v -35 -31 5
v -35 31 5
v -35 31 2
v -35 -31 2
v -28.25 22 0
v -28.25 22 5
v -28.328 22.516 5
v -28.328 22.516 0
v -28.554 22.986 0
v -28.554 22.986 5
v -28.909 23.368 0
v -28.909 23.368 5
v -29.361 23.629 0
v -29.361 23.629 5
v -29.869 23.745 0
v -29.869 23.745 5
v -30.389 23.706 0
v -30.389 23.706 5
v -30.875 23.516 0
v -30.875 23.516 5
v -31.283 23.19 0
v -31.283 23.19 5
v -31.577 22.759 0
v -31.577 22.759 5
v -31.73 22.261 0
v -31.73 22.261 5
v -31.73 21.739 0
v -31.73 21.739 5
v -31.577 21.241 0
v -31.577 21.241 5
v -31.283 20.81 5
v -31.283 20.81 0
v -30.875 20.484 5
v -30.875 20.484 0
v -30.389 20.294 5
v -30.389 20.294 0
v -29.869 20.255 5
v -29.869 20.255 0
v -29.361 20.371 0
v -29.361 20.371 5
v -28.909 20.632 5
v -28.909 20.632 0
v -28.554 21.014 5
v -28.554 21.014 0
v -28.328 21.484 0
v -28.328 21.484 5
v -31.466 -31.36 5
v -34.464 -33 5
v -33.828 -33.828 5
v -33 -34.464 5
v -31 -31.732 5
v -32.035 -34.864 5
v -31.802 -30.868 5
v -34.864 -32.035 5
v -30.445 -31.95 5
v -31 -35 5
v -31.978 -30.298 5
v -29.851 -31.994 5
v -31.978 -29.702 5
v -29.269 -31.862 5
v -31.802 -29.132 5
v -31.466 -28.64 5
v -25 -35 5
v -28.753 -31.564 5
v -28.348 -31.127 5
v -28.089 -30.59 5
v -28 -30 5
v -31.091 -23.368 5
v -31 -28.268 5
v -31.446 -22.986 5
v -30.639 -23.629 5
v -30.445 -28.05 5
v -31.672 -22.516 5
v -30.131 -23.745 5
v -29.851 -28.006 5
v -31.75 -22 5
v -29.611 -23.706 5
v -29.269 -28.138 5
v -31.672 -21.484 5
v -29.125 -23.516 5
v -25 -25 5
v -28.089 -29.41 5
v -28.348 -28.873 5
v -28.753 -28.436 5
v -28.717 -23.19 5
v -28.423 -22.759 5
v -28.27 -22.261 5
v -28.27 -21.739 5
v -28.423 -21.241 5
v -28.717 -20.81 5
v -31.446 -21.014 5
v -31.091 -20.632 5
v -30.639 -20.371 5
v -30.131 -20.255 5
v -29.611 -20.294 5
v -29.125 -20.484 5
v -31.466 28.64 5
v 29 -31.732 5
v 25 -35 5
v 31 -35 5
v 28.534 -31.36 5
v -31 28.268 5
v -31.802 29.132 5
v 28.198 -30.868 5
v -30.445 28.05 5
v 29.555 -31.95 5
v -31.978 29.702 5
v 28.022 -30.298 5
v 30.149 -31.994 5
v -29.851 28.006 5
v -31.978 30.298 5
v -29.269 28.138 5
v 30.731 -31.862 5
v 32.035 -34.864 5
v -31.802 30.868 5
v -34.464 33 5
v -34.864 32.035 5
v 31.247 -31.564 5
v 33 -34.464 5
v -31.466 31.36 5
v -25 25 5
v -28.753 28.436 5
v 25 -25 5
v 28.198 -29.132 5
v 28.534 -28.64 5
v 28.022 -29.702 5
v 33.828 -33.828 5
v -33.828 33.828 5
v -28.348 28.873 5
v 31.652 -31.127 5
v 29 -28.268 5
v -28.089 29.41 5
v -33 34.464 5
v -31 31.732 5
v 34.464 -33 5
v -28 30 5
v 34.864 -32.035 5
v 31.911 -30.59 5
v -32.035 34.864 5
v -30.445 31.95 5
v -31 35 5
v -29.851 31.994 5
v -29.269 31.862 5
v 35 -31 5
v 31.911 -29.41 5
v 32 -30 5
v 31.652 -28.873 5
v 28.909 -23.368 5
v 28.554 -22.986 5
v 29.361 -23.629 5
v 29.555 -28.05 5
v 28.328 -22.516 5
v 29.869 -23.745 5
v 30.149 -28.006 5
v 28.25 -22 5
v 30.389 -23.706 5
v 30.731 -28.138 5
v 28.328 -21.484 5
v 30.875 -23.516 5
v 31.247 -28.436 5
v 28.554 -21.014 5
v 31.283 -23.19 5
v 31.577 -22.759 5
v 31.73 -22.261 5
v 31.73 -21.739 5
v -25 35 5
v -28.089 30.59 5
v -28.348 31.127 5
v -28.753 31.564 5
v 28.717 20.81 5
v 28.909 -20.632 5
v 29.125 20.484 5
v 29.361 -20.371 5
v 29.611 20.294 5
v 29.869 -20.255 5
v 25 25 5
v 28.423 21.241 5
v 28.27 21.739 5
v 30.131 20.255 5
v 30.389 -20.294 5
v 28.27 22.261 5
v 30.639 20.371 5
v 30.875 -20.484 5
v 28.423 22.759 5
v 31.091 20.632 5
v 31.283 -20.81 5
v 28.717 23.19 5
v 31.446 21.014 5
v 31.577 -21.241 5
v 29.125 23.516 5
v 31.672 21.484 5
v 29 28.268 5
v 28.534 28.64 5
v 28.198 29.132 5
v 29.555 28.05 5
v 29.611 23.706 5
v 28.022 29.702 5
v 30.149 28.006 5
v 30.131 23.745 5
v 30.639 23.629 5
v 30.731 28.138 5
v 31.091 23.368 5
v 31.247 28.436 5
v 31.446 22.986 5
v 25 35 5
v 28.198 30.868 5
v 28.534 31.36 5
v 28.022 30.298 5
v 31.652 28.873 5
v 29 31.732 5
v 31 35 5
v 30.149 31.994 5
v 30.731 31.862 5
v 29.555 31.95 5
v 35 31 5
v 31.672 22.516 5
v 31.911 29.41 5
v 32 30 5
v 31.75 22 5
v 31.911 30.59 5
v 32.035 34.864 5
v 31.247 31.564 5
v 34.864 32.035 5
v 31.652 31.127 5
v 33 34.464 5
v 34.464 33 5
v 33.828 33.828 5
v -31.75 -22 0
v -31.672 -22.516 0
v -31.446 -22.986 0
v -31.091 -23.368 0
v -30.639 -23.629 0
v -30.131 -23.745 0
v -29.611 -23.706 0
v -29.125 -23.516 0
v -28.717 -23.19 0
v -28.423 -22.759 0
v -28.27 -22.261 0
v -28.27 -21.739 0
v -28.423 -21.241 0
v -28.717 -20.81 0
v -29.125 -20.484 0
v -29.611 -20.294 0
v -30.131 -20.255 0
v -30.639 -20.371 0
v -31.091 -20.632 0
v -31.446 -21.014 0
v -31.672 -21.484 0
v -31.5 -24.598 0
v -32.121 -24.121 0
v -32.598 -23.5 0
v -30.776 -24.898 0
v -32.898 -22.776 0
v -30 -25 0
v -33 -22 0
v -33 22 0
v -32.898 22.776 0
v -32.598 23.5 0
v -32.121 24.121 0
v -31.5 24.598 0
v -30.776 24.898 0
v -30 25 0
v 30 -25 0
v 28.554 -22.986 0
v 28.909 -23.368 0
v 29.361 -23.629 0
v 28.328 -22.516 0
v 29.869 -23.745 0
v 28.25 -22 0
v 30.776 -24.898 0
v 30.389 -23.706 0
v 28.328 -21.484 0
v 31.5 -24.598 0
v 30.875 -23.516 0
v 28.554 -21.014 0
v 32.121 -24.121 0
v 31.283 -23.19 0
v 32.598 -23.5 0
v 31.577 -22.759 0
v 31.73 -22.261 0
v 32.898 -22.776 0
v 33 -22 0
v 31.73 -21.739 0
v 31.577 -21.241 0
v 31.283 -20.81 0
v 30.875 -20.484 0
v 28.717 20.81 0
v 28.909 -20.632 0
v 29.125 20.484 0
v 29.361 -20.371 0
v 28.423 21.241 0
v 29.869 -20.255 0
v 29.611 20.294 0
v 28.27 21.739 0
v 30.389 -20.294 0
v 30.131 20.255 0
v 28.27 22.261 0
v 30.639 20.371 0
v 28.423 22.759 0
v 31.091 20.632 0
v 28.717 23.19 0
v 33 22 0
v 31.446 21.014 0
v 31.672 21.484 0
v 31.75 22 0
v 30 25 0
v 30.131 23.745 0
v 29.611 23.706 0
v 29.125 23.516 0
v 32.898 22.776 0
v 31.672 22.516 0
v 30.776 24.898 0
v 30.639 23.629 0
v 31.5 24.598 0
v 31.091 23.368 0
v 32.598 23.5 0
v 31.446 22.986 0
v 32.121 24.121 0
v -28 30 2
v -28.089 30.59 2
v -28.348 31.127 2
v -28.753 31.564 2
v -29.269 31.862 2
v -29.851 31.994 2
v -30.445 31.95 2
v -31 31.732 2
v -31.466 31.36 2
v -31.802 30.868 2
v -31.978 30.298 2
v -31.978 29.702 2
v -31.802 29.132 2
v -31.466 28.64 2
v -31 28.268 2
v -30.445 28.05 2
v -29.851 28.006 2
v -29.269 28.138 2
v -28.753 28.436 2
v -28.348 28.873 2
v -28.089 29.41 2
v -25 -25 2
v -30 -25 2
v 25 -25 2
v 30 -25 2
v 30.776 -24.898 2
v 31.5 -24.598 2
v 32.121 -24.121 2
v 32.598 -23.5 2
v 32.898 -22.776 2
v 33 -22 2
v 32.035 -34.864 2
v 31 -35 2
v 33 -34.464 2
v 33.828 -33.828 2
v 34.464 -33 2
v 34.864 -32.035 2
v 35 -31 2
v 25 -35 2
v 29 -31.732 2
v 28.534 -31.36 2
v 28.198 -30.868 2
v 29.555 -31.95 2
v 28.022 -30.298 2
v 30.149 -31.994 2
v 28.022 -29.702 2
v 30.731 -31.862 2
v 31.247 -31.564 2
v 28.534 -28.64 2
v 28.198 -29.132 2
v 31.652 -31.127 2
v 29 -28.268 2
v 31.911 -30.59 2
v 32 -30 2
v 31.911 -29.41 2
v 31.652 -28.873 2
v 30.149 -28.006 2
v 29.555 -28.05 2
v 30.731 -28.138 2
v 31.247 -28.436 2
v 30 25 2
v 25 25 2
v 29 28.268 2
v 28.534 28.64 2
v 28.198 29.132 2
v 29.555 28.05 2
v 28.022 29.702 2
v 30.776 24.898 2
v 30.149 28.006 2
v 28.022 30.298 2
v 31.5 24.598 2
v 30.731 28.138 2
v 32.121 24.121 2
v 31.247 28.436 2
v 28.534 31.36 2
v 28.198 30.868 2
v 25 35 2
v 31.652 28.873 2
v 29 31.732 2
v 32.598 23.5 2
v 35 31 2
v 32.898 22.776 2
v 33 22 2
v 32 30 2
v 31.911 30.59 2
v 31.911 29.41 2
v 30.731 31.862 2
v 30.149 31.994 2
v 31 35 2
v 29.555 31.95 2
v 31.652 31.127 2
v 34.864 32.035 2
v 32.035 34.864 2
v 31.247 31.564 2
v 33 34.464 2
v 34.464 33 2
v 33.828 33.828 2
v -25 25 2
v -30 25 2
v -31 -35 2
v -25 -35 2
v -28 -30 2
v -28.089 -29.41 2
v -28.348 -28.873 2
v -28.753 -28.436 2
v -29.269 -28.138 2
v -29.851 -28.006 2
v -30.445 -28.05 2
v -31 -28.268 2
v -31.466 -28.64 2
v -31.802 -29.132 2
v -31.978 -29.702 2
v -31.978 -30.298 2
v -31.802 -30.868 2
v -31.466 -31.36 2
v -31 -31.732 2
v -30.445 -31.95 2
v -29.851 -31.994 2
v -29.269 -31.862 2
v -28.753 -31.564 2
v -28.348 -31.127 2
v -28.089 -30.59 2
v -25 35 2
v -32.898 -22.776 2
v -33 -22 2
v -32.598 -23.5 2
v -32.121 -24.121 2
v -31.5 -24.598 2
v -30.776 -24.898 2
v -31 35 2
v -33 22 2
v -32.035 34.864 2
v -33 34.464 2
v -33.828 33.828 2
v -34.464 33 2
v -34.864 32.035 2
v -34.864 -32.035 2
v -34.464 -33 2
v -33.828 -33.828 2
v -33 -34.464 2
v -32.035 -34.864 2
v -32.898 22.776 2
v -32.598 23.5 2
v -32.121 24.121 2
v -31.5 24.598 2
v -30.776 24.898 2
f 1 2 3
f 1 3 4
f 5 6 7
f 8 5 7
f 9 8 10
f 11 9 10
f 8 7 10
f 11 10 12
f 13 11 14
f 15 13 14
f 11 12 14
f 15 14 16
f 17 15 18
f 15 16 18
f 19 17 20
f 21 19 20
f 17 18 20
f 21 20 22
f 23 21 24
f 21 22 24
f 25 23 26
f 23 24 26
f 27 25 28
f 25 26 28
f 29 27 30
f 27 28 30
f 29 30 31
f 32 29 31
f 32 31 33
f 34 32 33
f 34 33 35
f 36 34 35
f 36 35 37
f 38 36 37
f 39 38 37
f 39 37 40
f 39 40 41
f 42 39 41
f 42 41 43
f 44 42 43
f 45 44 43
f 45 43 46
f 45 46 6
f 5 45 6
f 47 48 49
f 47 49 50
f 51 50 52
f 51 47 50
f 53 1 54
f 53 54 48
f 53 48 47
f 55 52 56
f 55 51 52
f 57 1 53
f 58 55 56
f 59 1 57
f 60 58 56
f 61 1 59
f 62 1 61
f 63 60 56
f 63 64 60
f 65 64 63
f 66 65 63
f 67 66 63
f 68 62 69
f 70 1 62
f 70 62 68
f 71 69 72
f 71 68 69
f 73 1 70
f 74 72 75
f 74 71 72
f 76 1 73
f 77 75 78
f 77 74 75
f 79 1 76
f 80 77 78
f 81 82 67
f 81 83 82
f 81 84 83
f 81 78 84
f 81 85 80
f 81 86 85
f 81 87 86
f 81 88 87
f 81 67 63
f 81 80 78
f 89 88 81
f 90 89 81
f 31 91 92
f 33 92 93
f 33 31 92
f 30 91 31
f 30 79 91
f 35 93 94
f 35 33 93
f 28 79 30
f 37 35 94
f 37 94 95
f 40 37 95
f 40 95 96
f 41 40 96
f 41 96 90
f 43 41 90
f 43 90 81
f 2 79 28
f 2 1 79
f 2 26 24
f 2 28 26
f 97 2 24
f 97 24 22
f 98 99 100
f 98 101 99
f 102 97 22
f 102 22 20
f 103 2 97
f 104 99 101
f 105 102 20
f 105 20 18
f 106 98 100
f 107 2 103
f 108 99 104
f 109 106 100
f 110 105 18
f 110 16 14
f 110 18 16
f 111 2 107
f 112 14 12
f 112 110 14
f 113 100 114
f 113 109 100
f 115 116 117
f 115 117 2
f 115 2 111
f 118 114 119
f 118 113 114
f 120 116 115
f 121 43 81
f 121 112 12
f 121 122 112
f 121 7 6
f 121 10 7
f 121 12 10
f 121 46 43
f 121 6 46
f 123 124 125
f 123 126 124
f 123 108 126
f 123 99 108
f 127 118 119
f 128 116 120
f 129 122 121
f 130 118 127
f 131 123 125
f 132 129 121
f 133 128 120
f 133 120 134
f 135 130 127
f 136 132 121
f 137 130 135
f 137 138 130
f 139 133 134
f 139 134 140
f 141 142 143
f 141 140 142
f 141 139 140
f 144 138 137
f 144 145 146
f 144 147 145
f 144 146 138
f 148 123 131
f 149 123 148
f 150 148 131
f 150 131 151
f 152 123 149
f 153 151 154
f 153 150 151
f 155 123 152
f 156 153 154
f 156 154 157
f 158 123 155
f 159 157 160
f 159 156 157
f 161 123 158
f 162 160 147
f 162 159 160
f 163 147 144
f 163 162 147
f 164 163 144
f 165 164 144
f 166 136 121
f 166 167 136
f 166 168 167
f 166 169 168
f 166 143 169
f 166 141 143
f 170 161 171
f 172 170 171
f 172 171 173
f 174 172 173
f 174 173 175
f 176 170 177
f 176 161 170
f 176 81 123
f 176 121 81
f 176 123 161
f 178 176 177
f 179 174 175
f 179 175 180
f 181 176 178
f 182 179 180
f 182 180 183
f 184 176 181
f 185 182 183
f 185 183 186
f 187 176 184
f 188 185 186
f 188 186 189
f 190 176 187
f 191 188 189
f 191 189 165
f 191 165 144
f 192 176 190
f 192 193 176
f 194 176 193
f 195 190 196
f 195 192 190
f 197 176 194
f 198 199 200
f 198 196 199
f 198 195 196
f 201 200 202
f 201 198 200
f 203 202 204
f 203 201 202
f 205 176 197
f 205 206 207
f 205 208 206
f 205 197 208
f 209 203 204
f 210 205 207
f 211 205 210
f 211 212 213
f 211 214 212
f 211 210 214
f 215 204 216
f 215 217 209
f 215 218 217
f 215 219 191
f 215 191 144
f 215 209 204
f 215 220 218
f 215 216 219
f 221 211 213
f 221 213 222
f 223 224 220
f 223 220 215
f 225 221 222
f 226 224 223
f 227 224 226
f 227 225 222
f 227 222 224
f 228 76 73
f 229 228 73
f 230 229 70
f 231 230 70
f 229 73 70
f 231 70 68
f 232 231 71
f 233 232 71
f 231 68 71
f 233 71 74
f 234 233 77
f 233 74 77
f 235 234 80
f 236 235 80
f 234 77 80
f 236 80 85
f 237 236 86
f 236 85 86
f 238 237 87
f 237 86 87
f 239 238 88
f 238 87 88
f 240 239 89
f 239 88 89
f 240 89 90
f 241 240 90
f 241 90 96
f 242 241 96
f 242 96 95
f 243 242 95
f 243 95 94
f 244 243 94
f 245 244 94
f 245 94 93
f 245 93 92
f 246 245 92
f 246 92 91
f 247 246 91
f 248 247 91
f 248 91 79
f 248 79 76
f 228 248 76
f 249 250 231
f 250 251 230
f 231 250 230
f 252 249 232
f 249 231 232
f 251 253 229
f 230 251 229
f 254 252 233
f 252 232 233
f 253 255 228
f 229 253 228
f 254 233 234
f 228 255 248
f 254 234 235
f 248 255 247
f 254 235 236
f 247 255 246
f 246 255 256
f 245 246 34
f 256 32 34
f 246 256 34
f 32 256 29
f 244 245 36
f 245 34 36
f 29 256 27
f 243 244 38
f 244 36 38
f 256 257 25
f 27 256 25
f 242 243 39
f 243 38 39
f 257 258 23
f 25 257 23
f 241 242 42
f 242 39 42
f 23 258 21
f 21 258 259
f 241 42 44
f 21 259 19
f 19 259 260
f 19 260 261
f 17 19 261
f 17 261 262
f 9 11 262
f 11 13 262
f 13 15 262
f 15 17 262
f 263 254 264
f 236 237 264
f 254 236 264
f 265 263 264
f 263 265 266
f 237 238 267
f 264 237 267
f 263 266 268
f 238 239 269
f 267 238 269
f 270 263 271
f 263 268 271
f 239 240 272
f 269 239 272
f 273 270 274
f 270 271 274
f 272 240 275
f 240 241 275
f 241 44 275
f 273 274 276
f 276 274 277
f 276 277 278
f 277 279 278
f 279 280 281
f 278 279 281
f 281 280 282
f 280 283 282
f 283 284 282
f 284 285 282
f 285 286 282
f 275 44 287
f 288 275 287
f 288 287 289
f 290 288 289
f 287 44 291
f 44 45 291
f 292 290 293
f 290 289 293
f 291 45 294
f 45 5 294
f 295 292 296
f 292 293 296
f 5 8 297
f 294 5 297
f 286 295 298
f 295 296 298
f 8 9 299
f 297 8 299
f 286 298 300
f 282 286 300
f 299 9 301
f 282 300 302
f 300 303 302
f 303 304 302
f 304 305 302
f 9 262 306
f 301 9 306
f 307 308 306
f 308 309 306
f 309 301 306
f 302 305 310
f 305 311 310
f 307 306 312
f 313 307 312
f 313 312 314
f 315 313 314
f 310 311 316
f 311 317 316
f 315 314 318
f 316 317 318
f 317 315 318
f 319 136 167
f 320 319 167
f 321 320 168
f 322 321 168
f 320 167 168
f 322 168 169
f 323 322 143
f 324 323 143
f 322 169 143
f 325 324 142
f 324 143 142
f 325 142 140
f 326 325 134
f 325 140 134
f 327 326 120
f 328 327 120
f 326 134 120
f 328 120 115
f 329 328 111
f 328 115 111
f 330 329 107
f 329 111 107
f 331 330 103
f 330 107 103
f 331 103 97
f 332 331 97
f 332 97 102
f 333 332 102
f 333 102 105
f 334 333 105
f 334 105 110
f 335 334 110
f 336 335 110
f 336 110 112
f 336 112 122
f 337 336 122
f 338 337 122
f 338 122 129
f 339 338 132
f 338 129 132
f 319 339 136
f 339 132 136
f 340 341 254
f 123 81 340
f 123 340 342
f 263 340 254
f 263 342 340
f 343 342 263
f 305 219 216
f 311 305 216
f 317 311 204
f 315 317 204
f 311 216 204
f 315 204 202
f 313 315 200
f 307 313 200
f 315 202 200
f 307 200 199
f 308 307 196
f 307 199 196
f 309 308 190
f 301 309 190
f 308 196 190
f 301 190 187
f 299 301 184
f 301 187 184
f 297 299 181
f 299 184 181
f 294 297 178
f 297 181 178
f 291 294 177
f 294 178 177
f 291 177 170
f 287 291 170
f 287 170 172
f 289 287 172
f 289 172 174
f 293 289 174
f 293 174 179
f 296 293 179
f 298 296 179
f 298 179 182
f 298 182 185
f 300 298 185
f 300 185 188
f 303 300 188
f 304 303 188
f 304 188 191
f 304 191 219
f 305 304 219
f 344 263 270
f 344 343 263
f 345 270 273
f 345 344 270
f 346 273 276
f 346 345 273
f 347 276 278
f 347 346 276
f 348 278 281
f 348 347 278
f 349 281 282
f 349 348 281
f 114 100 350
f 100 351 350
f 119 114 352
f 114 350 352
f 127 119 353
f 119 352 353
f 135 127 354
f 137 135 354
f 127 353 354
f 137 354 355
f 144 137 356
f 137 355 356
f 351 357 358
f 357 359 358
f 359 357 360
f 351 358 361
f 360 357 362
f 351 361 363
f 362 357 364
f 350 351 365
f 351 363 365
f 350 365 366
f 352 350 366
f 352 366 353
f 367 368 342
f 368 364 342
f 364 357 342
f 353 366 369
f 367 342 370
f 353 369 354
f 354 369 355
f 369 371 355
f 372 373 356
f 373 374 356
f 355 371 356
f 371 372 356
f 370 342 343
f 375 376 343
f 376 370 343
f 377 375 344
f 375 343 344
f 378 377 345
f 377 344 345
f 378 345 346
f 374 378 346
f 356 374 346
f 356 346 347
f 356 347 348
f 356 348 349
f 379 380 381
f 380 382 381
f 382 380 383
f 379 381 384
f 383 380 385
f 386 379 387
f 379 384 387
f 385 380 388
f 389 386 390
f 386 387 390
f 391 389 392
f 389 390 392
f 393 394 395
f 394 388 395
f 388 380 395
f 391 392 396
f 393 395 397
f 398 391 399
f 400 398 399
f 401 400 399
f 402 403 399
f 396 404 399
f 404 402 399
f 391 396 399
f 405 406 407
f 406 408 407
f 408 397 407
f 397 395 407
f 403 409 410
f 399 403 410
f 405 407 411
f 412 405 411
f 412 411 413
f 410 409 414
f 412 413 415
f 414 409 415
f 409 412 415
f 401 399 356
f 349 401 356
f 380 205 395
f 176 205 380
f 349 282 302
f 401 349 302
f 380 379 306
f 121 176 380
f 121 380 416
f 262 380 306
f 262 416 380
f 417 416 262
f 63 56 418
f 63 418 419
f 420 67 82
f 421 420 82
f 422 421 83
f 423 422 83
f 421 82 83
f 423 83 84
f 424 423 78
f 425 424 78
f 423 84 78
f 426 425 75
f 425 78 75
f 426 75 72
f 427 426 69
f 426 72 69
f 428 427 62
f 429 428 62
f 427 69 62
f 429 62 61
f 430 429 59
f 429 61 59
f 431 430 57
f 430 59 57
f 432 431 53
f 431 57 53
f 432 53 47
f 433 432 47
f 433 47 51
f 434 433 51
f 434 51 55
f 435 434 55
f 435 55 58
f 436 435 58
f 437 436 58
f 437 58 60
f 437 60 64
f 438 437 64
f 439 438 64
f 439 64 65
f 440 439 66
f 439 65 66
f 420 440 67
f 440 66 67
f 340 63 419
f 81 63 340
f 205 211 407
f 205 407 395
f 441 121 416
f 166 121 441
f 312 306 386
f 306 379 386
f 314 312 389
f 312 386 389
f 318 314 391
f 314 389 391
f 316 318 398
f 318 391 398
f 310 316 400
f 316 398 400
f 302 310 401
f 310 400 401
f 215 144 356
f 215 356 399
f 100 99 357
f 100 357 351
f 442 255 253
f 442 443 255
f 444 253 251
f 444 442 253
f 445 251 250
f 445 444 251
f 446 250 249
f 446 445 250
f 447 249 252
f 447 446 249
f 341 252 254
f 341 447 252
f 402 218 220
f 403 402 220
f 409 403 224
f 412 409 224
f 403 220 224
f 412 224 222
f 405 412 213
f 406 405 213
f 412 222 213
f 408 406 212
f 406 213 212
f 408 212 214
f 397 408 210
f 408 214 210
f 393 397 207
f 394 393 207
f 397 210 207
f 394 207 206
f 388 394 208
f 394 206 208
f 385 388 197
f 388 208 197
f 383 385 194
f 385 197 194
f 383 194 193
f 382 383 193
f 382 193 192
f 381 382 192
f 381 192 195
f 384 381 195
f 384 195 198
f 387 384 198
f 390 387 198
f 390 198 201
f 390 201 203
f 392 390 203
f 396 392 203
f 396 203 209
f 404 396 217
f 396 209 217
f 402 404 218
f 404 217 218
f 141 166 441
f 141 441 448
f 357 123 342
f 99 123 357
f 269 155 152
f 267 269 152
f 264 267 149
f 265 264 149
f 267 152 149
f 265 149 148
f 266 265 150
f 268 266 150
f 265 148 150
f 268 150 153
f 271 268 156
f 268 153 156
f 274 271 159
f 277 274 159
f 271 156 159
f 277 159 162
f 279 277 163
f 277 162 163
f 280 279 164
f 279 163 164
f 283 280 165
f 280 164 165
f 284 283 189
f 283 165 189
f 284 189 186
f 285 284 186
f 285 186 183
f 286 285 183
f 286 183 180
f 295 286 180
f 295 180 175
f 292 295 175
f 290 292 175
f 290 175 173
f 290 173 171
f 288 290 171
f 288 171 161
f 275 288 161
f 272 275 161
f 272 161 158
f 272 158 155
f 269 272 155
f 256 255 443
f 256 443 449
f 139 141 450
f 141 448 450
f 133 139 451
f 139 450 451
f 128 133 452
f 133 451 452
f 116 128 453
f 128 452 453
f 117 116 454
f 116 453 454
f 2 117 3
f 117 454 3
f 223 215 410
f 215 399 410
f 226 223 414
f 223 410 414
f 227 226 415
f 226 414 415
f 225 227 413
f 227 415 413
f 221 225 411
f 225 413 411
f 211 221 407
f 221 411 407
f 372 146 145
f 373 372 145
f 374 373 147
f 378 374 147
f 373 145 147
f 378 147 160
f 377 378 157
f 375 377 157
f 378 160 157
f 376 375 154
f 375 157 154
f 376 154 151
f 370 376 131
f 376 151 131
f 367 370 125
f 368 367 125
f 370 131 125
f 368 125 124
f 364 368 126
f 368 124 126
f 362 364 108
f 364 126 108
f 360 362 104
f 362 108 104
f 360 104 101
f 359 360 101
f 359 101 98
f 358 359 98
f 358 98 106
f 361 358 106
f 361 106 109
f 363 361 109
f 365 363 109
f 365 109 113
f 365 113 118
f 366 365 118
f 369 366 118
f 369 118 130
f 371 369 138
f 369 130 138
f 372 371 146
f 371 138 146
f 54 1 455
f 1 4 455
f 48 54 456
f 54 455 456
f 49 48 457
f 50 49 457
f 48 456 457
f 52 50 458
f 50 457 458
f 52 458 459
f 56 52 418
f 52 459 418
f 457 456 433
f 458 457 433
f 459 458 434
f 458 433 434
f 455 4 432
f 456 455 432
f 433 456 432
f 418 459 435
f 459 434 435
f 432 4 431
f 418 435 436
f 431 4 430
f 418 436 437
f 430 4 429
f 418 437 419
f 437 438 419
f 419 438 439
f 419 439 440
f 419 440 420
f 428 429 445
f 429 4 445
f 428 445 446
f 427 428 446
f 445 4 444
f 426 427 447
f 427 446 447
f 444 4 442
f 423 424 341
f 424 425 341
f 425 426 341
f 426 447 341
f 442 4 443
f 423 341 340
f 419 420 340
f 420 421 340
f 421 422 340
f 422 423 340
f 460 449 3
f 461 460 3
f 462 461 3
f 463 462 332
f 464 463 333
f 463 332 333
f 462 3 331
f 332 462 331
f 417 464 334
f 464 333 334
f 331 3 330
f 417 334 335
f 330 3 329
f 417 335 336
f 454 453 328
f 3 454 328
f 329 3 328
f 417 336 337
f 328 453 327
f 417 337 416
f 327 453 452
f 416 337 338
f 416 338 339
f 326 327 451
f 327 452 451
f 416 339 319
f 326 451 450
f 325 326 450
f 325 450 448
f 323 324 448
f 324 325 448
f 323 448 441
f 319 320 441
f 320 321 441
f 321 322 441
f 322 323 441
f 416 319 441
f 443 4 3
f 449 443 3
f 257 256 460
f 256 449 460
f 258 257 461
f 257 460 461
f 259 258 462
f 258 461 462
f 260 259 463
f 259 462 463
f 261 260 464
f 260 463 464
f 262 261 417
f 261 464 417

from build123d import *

# Parameters (mm, degrees)
SKETCH1_W           = 66
SKETCH1_H           = 50
SKETCH1_R           = 1.75
BOSS_EXTRUDE1_DEPTH = 2
FILLET1_R           = 3
BOSS_EXTRUDE2_START = 3
SKETCH2_R           = 1.75
SKETCH2_R_2         = 2
BOSS_EXTRUDE2_DEPTH = 3
FILLET2_R           = 4


with BuildPart() as part:
    # Sketch1 → Boss-Extrude1 (new body)
    with BuildSketch(Plane.XY):
        Rectangle(SKETCH1_W, SKETCH1_H)
        with Locations((-30, 22)):
            Circle(SKETCH1_R, mode=Mode.SUBTRACT)
        with Locations((30, 22)):
            Circle(SKETCH1_R, mode=Mode.SUBTRACT)
        with Locations(Location((30, -22, 0), (0, 0, 180))):
            Circle(SKETCH1_R, mode=Mode.SUBTRACT)
        with Locations(Location((-30, -22, 0), (0, 0, 180))):
            Circle(SKETCH1_R, mode=Mode.SUBTRACT)
    extrude(amount=BOSS_EXTRUDE1_DEPTH)

    # Fillet1
    fillet1_edges = [part.edges().sort_by_distance(p)[0] for p in [
        (33, -25, 1),
        (-33, -25, 1),
        (-33, 25, 1),
        (33, 25, 1),
    ]]
    fillet(fillet1_edges, radius=FILLET1_R)

    # Sketch2 → Boss-Extrude2 (add)
    # profile 1 of 3: a face of its own
    with BuildSketch(Plane.XY.offset(2).offset(BOSS_EXTRUDE2_START)):
        with BuildLine():
            ThreePointArc((-30, 25), (-32.121320344, 24.121320344), (-33, 22))
            Line((-33, 22), (-33, -22))
            ThreePointArc((-33, -22), (-32.121320344, -24.121320344), (-30, -25))
            Line((-30, -25), (30, -25))
            ThreePointArc((30, -25), (32.121320344, -24.121320344), (33, -22))
            Line((33, -22), (33, 22))
            ThreePointArc((33, 22), (32.121320344, 24.121320344), (30, 25))
            Line((30, 25), (-30, 25))
        make_face()
        with Locations((-30, 22)):
            Circle(SKETCH2_R, mode=Mode.SUBTRACT)
        with Locations(Location((30, -22, 0), (0, 0, 180))):
            Circle(SKETCH2_R, mode=Mode.SUBTRACT)
        with Locations(Location((-30, -22, 0), (0, 0, 180))):
            Circle(SKETCH2_R, mode=Mode.SUBTRACT)
        with Locations((30, 22)):
            Circle(SKETCH2_R, mode=Mode.SUBTRACT)
    # profile 2 of 3: a face of its own
    with BuildSketch(Plane.XY.offset(2).offset(BOSS_EXTRUDE2_START)):
        with BuildLine():
            Line((-35, 35), (-35, -35))
            Line((-35, -35), (-25, -35))
            Line((-25, -35), (-25, -25))
            Line((-25, -25), (-30, -25))
            ThreePointArc((-30, -25), (-32.121320344, -24.121320344), (-33, -22))
            Line((-33, -22), (-33, 22))
            ThreePointArc((-33, 22), (-32.121320344, 24.121320344), (-30, 25))
            Line((-30, 25), (-25, 25))
            Line((-25, 25), (-25, 35))
            Line((-25, 35), (-35, 35))
        make_face()
        with Locations((-30, -30)):
            Circle(SKETCH2_R_2, mode=Mode.SUBTRACT)
        with Locations((-30, 30)):
            Circle(SKETCH2_R_2, mode=Mode.SUBTRACT)
    # profile 3 of 3: a face of its own
    with BuildSketch(Plane.XY.offset(2).offset(BOSS_EXTRUDE2_START)):
        with BuildLine():
            Line((25, -25), (25, -35))
            Line((25, -35), (35, -35))
            Line((35, -35), (35, 35))
            Line((35, 35), (25, 35))
            Line((25, 35), (25, 25))
            Line((25, 25), (30, 25))
            ThreePointArc((30, 25), (32.121320344, 24.121320344), (33, 22))
            Line((33, 22), (33, -22))
            ThreePointArc((33, -22), (32.121320344, -24.121320344), (30, -25))
            Line((30, -25), (25, -25))
        make_face()
        with Locations((30, -30)):
            Circle(SKETCH2_R_2, mode=Mode.SUBTRACT)
        with Locations((30, 30)):
            Circle(SKETCH2_R_2, mode=Mode.SUBTRACT)
    extrude(amount=-BOSS_EXTRUDE2_DEPTH)

    # Fillet2
    fillet2_edges = [part.edges().sort_by_distance(p)[0] for p in [
        (35, -35, 3.5),
        (35, 35, 3.5),
        (-35, 35, 3.5),
        (-35, -35, 3.5),
    ]]
    fillet(fillet2_edges, radius=FILLET2_R)


solid = part.part
